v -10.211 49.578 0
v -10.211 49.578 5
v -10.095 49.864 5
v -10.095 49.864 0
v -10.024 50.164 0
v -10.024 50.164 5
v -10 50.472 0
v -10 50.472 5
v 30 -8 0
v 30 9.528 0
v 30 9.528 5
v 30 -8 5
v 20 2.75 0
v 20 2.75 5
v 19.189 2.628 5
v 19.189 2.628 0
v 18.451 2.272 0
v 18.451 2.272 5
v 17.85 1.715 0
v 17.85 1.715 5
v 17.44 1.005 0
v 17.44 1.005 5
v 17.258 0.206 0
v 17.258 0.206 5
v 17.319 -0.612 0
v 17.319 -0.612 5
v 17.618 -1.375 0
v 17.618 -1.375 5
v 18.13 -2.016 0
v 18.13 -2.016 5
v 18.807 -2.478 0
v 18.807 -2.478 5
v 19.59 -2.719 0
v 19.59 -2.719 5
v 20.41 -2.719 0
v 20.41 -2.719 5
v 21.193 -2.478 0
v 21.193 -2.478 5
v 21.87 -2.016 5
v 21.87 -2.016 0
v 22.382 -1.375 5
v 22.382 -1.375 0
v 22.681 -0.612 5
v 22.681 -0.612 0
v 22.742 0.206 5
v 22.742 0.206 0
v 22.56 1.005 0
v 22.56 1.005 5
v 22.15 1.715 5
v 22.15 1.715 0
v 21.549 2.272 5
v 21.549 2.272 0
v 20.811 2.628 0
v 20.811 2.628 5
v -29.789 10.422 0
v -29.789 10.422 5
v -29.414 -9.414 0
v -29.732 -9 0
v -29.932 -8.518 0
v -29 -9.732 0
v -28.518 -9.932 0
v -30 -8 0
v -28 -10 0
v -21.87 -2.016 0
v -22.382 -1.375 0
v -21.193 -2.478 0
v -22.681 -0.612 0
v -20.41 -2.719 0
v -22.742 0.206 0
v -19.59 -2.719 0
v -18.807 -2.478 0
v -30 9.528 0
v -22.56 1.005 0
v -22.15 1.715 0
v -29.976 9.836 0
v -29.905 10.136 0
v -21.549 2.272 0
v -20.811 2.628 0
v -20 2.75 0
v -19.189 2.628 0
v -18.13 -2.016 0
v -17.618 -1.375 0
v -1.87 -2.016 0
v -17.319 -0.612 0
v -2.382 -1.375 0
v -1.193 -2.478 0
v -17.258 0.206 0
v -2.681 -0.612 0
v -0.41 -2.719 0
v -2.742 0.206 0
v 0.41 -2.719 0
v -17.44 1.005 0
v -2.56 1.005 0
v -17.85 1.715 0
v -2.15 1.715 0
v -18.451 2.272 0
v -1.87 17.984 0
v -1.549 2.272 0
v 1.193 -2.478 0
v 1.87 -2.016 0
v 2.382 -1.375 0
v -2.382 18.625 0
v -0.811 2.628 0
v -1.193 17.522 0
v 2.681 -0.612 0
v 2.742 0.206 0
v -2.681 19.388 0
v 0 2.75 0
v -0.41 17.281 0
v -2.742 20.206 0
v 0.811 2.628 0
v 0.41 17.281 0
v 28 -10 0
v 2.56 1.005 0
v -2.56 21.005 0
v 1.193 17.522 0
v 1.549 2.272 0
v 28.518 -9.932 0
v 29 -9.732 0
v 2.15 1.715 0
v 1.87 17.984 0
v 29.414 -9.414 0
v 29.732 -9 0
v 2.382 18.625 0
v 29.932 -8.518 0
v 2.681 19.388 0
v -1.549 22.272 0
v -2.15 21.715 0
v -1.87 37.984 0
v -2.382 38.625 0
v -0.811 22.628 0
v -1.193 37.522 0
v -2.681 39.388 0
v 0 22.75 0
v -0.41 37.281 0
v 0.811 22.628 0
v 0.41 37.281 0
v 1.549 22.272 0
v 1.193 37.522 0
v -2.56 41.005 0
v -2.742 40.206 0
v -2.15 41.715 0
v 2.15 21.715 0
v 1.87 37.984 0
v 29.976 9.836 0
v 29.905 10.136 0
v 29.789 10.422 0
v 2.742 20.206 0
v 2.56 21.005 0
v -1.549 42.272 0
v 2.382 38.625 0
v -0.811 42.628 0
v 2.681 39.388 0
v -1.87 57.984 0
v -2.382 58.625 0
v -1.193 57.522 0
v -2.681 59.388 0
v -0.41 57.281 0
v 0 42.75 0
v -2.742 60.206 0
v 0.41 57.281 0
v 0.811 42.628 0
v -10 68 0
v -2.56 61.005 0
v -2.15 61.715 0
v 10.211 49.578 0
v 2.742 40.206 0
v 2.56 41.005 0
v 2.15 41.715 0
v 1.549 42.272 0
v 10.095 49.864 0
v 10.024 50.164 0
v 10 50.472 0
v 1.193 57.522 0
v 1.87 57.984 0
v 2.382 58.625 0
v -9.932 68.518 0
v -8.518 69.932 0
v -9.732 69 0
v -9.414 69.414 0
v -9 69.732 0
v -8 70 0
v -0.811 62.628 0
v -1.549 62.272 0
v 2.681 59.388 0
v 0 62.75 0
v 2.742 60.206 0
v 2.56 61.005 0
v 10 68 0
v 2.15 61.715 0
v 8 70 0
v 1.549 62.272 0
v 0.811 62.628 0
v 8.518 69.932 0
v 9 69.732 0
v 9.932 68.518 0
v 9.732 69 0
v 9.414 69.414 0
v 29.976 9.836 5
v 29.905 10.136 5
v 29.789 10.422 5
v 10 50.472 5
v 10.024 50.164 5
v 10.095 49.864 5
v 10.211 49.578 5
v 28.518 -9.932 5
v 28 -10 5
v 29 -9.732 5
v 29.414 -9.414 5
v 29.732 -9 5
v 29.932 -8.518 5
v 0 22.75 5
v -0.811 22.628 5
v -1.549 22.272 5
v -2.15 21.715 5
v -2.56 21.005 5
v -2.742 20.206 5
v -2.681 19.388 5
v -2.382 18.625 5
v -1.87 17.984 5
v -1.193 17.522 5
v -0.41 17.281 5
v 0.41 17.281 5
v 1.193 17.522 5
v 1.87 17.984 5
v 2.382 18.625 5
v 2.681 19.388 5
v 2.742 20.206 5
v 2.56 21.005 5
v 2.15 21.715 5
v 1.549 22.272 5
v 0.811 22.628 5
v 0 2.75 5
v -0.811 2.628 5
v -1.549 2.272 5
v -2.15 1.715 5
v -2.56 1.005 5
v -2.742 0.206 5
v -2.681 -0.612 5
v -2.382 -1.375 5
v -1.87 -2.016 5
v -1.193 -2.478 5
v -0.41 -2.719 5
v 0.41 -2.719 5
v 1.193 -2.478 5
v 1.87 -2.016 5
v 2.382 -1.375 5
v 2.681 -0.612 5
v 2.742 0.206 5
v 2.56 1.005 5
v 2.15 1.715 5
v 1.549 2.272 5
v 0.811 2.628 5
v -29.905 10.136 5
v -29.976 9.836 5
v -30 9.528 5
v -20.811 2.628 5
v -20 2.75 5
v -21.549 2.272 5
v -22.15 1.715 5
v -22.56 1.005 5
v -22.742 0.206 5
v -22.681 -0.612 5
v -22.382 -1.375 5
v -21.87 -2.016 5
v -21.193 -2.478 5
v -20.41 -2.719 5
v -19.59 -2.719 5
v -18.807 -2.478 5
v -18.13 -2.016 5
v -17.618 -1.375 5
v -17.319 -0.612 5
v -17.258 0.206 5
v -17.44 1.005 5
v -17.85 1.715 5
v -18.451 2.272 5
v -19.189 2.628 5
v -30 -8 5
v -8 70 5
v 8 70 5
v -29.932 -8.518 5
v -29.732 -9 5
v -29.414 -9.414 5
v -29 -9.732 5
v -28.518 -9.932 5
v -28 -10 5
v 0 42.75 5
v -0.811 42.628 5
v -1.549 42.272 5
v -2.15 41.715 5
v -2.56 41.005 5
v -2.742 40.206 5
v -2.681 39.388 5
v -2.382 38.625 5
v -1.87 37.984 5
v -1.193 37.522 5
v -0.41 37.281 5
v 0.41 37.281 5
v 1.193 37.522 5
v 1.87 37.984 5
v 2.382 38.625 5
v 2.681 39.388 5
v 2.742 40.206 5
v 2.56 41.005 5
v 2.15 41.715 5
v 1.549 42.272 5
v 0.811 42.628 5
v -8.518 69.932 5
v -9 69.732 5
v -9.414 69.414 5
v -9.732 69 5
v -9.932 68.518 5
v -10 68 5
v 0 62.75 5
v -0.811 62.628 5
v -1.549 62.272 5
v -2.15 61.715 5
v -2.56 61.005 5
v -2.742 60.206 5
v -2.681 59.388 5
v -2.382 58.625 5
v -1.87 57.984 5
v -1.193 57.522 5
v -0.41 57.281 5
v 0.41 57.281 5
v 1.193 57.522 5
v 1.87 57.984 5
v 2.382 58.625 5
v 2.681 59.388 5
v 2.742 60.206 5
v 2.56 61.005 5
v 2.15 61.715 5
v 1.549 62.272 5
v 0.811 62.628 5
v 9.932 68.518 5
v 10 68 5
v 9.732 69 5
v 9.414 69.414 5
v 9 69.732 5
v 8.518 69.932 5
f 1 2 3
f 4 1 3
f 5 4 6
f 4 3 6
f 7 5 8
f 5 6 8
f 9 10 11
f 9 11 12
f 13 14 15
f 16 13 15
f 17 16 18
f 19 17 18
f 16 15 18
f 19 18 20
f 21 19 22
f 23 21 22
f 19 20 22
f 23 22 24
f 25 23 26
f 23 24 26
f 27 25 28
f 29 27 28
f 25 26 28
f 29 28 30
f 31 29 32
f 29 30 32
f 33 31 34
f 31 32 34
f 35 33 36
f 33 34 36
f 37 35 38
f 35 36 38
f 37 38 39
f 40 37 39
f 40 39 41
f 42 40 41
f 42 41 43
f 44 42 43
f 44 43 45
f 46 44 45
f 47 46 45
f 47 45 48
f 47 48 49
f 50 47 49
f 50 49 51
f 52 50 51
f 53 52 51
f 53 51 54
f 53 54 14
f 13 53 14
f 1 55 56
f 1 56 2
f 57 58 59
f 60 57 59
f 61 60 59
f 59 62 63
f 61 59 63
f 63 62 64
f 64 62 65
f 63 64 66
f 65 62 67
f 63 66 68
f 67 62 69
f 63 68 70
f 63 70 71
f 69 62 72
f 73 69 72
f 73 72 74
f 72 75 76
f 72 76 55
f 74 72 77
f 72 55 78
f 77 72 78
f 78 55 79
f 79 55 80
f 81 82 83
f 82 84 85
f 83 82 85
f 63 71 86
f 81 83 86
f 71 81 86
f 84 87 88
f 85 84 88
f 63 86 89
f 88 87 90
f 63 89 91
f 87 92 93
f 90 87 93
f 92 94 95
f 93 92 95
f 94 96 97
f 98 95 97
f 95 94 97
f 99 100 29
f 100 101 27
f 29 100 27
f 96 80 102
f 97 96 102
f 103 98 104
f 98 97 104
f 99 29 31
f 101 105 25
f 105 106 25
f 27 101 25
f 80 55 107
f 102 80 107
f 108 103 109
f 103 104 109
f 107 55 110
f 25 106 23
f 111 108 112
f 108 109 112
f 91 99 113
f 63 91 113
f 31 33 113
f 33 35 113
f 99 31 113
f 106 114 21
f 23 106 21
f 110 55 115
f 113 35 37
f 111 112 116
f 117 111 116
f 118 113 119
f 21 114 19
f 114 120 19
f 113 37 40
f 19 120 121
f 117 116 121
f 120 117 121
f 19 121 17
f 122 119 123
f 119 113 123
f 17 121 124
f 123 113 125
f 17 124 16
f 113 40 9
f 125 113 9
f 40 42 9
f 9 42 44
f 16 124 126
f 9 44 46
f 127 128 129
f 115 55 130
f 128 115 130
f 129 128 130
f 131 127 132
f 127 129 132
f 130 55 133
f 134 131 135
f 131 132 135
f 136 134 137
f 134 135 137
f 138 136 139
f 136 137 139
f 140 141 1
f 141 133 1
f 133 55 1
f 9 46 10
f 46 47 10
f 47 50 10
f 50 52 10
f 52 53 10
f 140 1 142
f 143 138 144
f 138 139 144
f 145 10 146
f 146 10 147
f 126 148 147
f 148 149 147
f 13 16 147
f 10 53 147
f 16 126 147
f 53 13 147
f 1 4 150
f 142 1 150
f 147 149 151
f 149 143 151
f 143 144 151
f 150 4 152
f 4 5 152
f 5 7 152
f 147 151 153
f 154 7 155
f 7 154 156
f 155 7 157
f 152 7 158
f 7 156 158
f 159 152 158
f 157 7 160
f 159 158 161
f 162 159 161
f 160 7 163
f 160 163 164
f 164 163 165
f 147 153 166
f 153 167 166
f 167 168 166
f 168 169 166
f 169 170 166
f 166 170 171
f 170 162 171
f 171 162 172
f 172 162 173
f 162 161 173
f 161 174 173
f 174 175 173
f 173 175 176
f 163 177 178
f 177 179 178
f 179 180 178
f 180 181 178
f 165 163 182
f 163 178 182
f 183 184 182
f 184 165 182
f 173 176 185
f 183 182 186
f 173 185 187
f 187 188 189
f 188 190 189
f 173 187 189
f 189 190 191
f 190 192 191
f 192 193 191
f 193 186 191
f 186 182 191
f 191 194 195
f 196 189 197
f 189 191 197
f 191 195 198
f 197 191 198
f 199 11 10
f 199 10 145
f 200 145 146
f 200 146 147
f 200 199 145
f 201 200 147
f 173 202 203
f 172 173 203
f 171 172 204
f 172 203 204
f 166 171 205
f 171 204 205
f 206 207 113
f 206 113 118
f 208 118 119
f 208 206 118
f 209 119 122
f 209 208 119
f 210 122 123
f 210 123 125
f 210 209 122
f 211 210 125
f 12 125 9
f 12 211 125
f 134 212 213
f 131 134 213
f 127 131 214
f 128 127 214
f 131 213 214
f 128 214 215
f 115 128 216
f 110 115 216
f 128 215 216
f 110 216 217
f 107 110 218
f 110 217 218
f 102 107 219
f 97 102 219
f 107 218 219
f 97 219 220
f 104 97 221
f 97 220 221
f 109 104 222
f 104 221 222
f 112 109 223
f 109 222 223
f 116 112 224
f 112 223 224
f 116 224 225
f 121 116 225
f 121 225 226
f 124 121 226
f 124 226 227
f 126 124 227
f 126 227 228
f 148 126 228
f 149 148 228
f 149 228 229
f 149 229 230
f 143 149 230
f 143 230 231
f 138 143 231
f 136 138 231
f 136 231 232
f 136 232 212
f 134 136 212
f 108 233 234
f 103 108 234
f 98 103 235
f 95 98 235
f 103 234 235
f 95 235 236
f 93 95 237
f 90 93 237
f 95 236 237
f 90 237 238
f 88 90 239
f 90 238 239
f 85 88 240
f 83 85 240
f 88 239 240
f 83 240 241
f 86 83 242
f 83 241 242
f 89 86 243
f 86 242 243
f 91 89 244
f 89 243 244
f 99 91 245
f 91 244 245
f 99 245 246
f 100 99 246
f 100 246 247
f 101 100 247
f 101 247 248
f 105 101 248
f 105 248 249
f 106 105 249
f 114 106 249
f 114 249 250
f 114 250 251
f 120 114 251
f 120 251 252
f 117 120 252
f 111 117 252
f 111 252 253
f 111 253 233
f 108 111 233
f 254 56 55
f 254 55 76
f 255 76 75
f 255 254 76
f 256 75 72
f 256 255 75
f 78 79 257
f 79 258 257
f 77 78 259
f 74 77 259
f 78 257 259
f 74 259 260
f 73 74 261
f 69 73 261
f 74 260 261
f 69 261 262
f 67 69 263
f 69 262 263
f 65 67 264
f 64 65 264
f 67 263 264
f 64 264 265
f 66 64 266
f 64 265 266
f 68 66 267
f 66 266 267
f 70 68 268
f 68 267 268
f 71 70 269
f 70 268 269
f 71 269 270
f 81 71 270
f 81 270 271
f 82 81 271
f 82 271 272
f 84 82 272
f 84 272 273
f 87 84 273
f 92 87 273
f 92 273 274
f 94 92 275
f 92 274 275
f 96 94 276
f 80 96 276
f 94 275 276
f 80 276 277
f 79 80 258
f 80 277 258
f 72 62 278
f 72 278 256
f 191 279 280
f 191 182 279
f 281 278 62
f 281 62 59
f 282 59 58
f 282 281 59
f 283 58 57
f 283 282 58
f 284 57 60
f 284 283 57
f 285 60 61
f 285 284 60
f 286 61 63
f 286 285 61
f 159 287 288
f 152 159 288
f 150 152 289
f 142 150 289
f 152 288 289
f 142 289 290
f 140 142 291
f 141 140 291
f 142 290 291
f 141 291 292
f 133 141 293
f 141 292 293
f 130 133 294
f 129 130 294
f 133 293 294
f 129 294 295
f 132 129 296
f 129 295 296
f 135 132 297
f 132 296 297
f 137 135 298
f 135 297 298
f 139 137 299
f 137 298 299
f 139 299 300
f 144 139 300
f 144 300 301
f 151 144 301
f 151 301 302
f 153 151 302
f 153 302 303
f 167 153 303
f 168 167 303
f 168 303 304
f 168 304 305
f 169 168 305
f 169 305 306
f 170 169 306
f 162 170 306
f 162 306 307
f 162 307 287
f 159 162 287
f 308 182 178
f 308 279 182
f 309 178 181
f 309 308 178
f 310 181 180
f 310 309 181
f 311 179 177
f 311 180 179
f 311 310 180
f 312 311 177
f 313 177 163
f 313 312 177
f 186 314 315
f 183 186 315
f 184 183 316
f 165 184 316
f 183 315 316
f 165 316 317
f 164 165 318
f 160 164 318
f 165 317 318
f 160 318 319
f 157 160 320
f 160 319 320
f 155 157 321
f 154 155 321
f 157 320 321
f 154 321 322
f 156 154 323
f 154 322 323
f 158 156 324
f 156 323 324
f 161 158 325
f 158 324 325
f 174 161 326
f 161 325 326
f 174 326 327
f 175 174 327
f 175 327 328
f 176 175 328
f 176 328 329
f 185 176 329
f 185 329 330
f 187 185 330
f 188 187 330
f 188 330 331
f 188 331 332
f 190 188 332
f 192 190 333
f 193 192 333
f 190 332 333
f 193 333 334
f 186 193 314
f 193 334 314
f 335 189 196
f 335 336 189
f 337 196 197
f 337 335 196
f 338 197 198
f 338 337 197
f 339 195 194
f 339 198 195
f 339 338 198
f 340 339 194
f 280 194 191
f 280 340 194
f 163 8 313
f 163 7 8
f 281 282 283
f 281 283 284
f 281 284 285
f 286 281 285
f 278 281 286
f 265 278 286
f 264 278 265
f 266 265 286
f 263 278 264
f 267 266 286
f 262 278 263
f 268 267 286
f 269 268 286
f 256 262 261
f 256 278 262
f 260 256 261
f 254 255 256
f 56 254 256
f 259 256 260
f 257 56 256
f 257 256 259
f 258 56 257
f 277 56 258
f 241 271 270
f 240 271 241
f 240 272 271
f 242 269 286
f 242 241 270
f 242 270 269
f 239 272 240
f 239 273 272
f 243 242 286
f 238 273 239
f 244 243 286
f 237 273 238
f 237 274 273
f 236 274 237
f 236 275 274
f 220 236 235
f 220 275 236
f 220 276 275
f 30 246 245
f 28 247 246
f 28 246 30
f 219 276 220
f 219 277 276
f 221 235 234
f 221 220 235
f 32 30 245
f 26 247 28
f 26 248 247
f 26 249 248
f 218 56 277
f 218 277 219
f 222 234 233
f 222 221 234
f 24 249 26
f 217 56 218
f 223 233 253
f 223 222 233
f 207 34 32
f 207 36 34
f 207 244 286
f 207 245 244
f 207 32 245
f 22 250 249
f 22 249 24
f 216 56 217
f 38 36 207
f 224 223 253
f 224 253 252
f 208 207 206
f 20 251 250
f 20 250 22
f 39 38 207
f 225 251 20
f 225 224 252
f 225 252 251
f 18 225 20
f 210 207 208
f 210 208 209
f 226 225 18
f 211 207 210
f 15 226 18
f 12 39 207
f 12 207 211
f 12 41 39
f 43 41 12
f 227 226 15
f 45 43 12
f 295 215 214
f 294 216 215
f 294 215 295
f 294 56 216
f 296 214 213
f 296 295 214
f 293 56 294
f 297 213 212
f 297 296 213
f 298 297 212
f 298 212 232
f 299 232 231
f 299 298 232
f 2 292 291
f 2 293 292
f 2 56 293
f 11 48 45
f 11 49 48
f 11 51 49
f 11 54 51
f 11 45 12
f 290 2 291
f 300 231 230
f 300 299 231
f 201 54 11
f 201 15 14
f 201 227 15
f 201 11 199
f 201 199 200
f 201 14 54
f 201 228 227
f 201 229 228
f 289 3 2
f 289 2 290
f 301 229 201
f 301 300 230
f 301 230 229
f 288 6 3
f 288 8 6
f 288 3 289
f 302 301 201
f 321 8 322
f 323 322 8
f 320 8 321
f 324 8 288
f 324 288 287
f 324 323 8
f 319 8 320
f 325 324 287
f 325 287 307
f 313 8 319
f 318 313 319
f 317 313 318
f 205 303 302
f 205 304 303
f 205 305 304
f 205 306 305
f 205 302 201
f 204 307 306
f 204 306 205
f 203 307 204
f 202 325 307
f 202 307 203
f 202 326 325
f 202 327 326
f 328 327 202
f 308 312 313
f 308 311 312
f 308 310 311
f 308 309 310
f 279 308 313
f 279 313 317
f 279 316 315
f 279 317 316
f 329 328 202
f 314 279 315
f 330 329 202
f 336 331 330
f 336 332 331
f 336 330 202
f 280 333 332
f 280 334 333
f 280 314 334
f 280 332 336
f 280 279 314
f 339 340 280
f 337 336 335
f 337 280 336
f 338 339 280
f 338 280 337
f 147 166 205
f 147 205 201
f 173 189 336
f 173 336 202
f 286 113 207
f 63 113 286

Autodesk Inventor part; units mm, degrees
ref_plane "YZ Plane" through (0, 0, 0) normal (1, 0, 0) x (0, 1, 0)
ref_plane "XZ Plane" through (0, 0, 0) normal (0, 1, 0) x (-1, 0, 0)
ref_plane "XY Plane" through (0, 0, 0) normal (0, 0, 1) x (1, 0, 0)
sketch "Sketch2" plane through (0, 0, 0) normal (0, 0, 1) x (1, 0, 0)
  line L0 (0, 0) -> (0, 20) construction
  line L1 (0, 20) -> (0, 40) construction
  line L2 (0, 40) -> (0, 60) construction
  line L3 (0, 0) -> (20, 0) construction
  line L4 (0, 0) -> (-20, 0) construction
  line L5 (-30, 10) -> (-10, 50)
  line L6 (-10, 50) -> (-10, 70)
  line L7 (-10, 70) -> (10, 70)
  line L8 (10, 70) -> (10, 50)
  line L9 (10, 50) -> (30, 10)
  line L10 (30, 10) -> (30, -10)
  line L11 (30, -10) -> (-30, -10)
  line L12 (-30, -10) -> (-30, 10)
  line L13 (0, 0) -> (0, -10) construction
  line L14 (0, 70) -> (0, 60) construction
  dimension "d0" = 20
  dimension "d1" = 10
  dimension "d2" = 20
  dimension "d3" = 60
  dimension "d4" = 10
  dimension "d5" = 20
extrude "Extrusion1" add sketch "Sketch2" along normal blind 5
hole "Hole1" at (0, 40, 0) at (0, 20, 0) at (0, 60, 0) at (-20, 0, 0) at (0, 0, 0) at (20, 0, 0) direction (0, 0, 1) diameter 5.5 end through all clearance for "Flat Head Machine Screw" size "M5" standard "Ansi Metric M Profile"
fillet "Fillet1" radius 2 8 edges at (-10, 70, 2.5) (-30, 10, 2.5) (-30, -10, 2.5) (30, -10, 2.5) (30, 10, 2.5) (10, 70, 2.5) (10, 50, 2.5) (-10, 50, 2.5)
properties part number "8060T"
